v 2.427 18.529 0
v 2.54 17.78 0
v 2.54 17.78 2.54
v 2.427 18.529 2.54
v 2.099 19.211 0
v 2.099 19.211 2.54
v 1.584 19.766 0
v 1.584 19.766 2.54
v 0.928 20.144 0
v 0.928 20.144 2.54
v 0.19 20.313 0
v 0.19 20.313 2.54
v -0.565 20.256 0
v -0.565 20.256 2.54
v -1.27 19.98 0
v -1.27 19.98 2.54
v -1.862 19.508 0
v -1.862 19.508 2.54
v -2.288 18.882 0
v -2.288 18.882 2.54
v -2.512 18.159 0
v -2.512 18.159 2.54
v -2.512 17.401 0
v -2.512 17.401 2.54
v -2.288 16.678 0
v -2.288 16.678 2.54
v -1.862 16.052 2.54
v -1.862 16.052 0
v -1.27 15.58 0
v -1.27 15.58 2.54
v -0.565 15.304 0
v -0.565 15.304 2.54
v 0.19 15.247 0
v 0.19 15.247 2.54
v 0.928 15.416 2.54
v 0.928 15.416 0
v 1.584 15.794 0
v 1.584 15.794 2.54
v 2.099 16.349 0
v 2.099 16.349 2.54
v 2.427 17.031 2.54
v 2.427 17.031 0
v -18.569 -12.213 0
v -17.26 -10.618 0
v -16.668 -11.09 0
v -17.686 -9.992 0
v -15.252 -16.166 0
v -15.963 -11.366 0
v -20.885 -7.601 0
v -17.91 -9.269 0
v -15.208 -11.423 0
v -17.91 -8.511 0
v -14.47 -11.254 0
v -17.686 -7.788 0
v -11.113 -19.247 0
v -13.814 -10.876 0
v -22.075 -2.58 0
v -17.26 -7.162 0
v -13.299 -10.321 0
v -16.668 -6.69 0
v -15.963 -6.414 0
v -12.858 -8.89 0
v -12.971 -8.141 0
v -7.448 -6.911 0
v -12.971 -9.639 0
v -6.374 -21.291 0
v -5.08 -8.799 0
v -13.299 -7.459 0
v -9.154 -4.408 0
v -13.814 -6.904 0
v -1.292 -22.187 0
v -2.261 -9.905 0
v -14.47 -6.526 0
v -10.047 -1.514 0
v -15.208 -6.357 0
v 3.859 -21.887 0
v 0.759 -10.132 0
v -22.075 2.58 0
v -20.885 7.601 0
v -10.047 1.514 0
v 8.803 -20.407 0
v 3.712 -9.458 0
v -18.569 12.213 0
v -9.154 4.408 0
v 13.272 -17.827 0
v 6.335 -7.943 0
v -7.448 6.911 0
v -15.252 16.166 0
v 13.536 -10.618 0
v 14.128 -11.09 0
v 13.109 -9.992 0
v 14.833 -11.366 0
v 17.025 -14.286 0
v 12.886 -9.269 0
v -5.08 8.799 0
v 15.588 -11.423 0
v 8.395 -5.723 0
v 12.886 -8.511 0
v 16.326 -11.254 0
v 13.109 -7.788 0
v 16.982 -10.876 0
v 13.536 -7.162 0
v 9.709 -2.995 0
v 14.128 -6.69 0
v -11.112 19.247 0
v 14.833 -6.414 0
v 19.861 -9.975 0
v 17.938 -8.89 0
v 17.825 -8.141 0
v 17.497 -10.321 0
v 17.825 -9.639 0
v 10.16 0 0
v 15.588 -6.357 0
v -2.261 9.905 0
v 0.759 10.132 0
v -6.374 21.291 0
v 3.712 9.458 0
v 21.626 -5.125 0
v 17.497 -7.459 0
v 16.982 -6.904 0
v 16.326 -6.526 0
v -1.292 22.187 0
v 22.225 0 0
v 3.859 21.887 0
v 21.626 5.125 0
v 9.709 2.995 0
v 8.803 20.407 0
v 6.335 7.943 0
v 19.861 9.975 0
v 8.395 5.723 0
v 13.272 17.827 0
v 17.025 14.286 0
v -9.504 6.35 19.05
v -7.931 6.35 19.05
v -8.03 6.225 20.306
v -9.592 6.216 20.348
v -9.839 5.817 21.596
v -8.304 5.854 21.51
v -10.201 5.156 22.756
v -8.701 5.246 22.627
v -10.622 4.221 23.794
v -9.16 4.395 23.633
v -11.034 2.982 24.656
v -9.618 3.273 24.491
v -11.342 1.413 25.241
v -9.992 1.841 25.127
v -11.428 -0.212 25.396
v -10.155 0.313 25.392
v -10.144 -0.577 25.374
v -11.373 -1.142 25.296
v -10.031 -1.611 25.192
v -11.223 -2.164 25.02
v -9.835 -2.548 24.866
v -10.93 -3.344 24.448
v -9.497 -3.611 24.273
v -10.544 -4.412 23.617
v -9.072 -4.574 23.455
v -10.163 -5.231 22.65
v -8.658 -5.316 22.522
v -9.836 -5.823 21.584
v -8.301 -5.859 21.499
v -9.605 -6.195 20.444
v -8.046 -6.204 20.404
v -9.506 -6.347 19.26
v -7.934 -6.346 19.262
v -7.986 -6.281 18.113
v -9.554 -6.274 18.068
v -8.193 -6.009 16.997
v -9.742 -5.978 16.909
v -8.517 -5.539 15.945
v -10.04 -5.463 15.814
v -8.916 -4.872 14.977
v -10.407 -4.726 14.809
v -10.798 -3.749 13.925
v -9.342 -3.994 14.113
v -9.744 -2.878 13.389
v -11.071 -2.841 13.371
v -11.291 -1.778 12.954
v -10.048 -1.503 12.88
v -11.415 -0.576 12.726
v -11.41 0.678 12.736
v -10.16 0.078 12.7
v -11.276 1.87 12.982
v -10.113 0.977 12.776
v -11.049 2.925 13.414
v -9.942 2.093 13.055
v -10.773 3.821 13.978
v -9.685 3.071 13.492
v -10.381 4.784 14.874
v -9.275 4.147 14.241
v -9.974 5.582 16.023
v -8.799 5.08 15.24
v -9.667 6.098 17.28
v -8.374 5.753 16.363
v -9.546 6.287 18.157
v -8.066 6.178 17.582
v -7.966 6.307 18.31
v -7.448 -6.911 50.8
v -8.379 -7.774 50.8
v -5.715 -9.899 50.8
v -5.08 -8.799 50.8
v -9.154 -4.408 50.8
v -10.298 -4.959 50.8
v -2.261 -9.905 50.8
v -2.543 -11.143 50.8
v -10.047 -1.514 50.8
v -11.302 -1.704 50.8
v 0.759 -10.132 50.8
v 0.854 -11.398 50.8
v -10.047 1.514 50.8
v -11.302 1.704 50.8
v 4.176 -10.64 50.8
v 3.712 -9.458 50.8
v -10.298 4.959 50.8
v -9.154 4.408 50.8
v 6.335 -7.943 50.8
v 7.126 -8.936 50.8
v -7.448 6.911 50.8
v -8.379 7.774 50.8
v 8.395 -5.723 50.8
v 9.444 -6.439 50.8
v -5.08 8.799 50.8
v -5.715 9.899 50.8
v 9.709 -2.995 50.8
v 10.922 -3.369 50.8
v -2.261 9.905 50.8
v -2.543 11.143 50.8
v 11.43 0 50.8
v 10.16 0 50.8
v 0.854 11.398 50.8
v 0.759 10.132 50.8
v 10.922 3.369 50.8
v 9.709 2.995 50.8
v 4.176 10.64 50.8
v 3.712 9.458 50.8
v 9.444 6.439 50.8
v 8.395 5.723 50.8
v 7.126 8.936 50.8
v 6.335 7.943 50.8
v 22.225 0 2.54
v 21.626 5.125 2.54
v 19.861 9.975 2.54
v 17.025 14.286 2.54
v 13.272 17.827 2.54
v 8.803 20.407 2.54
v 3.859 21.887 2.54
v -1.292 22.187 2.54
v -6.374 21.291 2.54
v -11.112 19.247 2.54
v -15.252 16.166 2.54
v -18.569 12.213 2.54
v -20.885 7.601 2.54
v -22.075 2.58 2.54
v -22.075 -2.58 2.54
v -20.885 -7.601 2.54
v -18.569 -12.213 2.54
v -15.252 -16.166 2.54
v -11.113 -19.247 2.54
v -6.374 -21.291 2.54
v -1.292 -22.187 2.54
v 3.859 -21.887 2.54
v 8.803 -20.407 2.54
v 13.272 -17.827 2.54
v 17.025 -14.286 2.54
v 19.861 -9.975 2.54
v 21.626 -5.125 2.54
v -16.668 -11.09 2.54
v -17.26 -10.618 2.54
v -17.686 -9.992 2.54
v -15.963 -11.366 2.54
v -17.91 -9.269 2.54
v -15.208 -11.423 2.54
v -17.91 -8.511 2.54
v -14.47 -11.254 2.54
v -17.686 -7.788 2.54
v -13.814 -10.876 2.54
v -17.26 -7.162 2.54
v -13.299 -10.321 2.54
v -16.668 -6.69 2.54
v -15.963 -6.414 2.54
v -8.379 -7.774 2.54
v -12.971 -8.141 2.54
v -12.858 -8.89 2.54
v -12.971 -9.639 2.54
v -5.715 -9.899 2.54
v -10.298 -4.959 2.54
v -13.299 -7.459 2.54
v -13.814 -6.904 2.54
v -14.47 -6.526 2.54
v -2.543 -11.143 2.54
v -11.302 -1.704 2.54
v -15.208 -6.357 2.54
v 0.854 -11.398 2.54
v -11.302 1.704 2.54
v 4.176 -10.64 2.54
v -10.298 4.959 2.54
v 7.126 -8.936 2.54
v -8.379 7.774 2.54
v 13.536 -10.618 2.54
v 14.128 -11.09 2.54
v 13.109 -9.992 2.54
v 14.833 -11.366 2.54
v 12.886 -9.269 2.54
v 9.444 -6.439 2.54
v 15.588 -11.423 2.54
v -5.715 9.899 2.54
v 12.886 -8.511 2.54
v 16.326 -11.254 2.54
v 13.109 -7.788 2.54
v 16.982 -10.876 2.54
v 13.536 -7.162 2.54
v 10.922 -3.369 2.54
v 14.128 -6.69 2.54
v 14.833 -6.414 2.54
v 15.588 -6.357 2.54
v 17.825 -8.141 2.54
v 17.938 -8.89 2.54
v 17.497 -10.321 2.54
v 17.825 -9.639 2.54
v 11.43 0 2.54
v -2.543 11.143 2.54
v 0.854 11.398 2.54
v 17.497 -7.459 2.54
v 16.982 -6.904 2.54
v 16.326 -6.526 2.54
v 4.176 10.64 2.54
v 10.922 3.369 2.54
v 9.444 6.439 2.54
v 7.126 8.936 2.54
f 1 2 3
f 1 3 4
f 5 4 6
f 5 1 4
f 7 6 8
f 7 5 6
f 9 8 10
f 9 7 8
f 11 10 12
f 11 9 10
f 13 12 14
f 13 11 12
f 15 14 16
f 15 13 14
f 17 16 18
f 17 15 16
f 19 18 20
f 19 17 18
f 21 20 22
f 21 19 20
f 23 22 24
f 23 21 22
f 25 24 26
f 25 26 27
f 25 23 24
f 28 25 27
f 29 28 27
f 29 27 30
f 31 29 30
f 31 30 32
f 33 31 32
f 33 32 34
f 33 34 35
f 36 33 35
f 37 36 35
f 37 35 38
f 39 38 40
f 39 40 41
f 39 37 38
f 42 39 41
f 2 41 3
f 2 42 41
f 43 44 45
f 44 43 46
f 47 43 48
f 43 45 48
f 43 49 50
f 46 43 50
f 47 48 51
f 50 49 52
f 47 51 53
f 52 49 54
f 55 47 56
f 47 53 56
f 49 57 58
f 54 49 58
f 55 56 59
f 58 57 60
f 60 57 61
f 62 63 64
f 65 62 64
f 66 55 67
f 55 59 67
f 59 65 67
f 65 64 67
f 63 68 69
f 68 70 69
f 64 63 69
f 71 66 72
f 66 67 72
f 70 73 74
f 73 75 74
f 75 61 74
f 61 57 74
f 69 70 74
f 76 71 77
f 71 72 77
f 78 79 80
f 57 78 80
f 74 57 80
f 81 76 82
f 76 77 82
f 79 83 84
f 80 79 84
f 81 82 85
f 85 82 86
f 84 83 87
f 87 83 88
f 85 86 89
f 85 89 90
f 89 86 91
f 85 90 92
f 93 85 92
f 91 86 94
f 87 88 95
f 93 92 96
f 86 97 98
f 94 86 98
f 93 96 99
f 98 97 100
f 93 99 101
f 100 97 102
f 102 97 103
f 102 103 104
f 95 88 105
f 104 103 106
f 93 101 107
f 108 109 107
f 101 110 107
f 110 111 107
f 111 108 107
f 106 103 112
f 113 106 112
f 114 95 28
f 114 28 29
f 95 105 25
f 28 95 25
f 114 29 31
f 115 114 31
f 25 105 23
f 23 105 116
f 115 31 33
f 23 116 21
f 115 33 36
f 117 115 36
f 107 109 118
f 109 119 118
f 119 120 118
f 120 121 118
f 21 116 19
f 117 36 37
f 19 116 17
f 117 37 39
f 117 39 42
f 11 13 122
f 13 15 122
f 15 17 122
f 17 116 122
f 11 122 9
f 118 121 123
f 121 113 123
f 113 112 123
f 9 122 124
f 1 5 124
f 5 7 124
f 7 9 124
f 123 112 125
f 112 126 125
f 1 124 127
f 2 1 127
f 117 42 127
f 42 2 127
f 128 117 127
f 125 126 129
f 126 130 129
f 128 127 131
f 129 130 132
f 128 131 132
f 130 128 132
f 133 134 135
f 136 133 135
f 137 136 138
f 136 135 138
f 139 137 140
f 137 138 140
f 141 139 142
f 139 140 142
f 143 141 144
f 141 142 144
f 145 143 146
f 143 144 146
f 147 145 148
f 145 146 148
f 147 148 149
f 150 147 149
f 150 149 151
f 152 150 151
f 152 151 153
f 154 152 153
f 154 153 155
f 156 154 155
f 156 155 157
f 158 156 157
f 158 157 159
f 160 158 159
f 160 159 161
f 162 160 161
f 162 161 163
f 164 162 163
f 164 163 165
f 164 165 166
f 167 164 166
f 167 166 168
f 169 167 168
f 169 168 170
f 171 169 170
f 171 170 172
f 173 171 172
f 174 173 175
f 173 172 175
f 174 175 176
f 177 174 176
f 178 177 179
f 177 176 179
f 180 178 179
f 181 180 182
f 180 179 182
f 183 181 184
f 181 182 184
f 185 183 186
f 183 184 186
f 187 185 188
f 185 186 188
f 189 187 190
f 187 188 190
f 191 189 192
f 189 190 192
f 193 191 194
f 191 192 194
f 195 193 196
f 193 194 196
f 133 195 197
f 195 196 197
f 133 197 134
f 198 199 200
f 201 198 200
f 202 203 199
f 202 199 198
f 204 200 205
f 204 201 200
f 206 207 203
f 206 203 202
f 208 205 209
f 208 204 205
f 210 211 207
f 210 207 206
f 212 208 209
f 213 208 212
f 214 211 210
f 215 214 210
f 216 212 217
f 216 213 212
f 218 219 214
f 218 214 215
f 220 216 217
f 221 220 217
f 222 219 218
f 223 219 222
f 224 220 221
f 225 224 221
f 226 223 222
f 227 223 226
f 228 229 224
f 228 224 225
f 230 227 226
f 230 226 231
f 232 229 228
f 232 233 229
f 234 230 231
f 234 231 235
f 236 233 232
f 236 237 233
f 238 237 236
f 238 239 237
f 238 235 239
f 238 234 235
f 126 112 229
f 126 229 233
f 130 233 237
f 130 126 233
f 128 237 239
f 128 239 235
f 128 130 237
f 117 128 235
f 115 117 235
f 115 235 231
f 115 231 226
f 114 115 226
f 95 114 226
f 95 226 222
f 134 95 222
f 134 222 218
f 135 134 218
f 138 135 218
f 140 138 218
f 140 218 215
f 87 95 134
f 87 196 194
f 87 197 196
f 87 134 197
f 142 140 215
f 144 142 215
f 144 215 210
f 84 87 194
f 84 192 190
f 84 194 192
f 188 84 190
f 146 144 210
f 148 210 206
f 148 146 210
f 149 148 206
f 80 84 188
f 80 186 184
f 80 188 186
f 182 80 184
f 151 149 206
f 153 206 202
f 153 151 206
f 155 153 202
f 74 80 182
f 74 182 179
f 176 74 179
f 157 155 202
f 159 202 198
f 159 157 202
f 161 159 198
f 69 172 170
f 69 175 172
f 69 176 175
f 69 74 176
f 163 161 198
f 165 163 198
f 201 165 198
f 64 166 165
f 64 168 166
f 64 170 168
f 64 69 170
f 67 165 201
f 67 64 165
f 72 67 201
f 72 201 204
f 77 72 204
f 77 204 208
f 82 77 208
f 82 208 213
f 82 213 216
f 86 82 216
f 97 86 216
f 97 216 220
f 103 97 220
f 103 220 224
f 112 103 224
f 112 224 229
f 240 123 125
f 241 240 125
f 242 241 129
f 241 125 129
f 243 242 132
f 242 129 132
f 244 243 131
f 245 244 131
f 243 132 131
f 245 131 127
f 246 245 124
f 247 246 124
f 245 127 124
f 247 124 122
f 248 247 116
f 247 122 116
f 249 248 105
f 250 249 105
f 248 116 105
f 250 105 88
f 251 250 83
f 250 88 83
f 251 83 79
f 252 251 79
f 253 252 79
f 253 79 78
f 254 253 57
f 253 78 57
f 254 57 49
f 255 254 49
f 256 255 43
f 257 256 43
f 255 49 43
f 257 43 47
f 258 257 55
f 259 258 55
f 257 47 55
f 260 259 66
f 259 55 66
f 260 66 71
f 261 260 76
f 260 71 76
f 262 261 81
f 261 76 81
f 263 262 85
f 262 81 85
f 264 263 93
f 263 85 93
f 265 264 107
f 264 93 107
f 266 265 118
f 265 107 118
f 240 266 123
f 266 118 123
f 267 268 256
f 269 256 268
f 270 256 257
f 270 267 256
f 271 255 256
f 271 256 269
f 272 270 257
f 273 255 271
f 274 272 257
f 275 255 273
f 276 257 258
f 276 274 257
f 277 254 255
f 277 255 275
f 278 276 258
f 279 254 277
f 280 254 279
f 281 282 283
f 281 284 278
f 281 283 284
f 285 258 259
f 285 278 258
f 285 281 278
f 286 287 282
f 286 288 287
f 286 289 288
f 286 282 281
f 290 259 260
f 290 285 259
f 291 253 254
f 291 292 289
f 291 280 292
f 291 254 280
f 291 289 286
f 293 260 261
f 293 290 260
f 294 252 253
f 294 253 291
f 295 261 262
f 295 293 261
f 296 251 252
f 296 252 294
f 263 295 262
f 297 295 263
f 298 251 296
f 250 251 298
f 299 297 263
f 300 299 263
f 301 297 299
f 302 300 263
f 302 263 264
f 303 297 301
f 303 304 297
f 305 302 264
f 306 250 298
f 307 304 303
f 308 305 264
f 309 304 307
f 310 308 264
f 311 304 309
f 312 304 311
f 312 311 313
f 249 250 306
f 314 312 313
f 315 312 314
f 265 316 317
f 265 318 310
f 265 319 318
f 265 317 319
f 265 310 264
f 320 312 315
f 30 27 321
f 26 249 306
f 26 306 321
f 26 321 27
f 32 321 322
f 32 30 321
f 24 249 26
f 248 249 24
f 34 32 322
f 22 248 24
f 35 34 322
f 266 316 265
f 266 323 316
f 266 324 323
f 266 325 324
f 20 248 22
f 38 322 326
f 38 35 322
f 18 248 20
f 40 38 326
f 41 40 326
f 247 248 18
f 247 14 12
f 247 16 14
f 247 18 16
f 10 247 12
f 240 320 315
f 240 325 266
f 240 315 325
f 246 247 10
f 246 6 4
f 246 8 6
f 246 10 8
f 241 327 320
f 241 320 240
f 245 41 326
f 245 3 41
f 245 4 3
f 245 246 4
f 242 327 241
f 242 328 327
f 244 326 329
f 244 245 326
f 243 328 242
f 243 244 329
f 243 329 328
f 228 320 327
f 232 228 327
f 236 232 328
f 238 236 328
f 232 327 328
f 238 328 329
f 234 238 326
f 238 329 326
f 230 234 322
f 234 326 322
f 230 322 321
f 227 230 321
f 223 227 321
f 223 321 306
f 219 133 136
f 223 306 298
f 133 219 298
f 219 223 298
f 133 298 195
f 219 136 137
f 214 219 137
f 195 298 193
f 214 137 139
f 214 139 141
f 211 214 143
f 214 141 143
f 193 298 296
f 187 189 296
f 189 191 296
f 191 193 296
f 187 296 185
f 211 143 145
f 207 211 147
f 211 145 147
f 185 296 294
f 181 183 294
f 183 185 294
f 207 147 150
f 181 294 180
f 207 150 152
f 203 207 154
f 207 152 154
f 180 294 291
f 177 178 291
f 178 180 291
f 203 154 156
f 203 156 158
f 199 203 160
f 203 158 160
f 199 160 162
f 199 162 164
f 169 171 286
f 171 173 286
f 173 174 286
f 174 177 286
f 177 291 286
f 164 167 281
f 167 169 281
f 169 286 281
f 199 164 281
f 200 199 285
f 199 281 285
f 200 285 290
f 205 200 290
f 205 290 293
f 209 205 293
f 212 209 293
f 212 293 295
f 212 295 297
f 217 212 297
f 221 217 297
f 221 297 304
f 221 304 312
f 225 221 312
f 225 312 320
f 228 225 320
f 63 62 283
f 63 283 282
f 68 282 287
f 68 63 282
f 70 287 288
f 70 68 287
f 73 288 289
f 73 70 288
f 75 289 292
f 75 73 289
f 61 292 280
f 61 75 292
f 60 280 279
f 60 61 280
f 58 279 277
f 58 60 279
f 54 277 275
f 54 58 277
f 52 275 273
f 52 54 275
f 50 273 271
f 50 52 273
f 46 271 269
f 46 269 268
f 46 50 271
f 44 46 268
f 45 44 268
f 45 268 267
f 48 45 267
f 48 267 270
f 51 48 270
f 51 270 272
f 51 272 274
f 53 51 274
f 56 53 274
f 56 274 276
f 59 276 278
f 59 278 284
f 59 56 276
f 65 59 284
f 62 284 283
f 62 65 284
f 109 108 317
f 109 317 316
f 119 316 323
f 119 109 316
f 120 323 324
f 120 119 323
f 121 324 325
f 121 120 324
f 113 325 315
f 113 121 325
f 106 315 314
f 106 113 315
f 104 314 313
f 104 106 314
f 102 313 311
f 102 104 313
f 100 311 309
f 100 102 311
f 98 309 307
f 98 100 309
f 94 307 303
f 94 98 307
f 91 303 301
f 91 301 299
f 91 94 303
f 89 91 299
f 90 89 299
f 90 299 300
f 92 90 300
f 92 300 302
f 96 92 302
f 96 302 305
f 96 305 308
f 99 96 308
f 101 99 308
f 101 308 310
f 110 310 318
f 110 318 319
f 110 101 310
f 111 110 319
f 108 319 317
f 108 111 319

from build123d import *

# Parameters (mm, degrees)
F0_R     = 11.43
F0_R_2   = 10.16
F1_DEPTH = 50.8
F0_R_3   = 22.225
F0_R_4   = 2.54
F2_DEPTH = 2.54
F3_R     = 6.35
F4_DEPTH = 12.7


with BuildPart() as f1:
    # F0 (on Top) → F1 (new body)
    with BuildSketch(Plane.XY):
        Circle(F0_R)
        Circle(F0_R_2, mode=Mode.SUBTRACT)
    extrude(amount=F1_DEPTH)

    # F0 (on Top) → F2 (join)
    with BuildSketch(Plane.XY):
        Circle(F0_R_3)
        with Locations((-15.397932, -8.89)):
            Circle(F0_R_4, mode=Mode.SUBTRACT)
        with Locations((15.397932, -8.89)):
            Circle(F0_R_4, mode=Mode.SUBTRACT)
        Circle(F0_R, mode=Mode.SUBTRACT)
        with Locations((0, 17.78)):
            Circle(F0_R_4, mode=Mode.SUBTRACT)
    extrude(amount=F2_DEPTH)

    # F3 (on Right) → F4 (cut)
    with BuildSketch(Plane.YZ):
        with Locations((0, 19.05)):
            Circle(F3_R)
    extrude(amount=-F4_DEPTH, mode=Mode.SUBTRACT)


solid = f1.part
